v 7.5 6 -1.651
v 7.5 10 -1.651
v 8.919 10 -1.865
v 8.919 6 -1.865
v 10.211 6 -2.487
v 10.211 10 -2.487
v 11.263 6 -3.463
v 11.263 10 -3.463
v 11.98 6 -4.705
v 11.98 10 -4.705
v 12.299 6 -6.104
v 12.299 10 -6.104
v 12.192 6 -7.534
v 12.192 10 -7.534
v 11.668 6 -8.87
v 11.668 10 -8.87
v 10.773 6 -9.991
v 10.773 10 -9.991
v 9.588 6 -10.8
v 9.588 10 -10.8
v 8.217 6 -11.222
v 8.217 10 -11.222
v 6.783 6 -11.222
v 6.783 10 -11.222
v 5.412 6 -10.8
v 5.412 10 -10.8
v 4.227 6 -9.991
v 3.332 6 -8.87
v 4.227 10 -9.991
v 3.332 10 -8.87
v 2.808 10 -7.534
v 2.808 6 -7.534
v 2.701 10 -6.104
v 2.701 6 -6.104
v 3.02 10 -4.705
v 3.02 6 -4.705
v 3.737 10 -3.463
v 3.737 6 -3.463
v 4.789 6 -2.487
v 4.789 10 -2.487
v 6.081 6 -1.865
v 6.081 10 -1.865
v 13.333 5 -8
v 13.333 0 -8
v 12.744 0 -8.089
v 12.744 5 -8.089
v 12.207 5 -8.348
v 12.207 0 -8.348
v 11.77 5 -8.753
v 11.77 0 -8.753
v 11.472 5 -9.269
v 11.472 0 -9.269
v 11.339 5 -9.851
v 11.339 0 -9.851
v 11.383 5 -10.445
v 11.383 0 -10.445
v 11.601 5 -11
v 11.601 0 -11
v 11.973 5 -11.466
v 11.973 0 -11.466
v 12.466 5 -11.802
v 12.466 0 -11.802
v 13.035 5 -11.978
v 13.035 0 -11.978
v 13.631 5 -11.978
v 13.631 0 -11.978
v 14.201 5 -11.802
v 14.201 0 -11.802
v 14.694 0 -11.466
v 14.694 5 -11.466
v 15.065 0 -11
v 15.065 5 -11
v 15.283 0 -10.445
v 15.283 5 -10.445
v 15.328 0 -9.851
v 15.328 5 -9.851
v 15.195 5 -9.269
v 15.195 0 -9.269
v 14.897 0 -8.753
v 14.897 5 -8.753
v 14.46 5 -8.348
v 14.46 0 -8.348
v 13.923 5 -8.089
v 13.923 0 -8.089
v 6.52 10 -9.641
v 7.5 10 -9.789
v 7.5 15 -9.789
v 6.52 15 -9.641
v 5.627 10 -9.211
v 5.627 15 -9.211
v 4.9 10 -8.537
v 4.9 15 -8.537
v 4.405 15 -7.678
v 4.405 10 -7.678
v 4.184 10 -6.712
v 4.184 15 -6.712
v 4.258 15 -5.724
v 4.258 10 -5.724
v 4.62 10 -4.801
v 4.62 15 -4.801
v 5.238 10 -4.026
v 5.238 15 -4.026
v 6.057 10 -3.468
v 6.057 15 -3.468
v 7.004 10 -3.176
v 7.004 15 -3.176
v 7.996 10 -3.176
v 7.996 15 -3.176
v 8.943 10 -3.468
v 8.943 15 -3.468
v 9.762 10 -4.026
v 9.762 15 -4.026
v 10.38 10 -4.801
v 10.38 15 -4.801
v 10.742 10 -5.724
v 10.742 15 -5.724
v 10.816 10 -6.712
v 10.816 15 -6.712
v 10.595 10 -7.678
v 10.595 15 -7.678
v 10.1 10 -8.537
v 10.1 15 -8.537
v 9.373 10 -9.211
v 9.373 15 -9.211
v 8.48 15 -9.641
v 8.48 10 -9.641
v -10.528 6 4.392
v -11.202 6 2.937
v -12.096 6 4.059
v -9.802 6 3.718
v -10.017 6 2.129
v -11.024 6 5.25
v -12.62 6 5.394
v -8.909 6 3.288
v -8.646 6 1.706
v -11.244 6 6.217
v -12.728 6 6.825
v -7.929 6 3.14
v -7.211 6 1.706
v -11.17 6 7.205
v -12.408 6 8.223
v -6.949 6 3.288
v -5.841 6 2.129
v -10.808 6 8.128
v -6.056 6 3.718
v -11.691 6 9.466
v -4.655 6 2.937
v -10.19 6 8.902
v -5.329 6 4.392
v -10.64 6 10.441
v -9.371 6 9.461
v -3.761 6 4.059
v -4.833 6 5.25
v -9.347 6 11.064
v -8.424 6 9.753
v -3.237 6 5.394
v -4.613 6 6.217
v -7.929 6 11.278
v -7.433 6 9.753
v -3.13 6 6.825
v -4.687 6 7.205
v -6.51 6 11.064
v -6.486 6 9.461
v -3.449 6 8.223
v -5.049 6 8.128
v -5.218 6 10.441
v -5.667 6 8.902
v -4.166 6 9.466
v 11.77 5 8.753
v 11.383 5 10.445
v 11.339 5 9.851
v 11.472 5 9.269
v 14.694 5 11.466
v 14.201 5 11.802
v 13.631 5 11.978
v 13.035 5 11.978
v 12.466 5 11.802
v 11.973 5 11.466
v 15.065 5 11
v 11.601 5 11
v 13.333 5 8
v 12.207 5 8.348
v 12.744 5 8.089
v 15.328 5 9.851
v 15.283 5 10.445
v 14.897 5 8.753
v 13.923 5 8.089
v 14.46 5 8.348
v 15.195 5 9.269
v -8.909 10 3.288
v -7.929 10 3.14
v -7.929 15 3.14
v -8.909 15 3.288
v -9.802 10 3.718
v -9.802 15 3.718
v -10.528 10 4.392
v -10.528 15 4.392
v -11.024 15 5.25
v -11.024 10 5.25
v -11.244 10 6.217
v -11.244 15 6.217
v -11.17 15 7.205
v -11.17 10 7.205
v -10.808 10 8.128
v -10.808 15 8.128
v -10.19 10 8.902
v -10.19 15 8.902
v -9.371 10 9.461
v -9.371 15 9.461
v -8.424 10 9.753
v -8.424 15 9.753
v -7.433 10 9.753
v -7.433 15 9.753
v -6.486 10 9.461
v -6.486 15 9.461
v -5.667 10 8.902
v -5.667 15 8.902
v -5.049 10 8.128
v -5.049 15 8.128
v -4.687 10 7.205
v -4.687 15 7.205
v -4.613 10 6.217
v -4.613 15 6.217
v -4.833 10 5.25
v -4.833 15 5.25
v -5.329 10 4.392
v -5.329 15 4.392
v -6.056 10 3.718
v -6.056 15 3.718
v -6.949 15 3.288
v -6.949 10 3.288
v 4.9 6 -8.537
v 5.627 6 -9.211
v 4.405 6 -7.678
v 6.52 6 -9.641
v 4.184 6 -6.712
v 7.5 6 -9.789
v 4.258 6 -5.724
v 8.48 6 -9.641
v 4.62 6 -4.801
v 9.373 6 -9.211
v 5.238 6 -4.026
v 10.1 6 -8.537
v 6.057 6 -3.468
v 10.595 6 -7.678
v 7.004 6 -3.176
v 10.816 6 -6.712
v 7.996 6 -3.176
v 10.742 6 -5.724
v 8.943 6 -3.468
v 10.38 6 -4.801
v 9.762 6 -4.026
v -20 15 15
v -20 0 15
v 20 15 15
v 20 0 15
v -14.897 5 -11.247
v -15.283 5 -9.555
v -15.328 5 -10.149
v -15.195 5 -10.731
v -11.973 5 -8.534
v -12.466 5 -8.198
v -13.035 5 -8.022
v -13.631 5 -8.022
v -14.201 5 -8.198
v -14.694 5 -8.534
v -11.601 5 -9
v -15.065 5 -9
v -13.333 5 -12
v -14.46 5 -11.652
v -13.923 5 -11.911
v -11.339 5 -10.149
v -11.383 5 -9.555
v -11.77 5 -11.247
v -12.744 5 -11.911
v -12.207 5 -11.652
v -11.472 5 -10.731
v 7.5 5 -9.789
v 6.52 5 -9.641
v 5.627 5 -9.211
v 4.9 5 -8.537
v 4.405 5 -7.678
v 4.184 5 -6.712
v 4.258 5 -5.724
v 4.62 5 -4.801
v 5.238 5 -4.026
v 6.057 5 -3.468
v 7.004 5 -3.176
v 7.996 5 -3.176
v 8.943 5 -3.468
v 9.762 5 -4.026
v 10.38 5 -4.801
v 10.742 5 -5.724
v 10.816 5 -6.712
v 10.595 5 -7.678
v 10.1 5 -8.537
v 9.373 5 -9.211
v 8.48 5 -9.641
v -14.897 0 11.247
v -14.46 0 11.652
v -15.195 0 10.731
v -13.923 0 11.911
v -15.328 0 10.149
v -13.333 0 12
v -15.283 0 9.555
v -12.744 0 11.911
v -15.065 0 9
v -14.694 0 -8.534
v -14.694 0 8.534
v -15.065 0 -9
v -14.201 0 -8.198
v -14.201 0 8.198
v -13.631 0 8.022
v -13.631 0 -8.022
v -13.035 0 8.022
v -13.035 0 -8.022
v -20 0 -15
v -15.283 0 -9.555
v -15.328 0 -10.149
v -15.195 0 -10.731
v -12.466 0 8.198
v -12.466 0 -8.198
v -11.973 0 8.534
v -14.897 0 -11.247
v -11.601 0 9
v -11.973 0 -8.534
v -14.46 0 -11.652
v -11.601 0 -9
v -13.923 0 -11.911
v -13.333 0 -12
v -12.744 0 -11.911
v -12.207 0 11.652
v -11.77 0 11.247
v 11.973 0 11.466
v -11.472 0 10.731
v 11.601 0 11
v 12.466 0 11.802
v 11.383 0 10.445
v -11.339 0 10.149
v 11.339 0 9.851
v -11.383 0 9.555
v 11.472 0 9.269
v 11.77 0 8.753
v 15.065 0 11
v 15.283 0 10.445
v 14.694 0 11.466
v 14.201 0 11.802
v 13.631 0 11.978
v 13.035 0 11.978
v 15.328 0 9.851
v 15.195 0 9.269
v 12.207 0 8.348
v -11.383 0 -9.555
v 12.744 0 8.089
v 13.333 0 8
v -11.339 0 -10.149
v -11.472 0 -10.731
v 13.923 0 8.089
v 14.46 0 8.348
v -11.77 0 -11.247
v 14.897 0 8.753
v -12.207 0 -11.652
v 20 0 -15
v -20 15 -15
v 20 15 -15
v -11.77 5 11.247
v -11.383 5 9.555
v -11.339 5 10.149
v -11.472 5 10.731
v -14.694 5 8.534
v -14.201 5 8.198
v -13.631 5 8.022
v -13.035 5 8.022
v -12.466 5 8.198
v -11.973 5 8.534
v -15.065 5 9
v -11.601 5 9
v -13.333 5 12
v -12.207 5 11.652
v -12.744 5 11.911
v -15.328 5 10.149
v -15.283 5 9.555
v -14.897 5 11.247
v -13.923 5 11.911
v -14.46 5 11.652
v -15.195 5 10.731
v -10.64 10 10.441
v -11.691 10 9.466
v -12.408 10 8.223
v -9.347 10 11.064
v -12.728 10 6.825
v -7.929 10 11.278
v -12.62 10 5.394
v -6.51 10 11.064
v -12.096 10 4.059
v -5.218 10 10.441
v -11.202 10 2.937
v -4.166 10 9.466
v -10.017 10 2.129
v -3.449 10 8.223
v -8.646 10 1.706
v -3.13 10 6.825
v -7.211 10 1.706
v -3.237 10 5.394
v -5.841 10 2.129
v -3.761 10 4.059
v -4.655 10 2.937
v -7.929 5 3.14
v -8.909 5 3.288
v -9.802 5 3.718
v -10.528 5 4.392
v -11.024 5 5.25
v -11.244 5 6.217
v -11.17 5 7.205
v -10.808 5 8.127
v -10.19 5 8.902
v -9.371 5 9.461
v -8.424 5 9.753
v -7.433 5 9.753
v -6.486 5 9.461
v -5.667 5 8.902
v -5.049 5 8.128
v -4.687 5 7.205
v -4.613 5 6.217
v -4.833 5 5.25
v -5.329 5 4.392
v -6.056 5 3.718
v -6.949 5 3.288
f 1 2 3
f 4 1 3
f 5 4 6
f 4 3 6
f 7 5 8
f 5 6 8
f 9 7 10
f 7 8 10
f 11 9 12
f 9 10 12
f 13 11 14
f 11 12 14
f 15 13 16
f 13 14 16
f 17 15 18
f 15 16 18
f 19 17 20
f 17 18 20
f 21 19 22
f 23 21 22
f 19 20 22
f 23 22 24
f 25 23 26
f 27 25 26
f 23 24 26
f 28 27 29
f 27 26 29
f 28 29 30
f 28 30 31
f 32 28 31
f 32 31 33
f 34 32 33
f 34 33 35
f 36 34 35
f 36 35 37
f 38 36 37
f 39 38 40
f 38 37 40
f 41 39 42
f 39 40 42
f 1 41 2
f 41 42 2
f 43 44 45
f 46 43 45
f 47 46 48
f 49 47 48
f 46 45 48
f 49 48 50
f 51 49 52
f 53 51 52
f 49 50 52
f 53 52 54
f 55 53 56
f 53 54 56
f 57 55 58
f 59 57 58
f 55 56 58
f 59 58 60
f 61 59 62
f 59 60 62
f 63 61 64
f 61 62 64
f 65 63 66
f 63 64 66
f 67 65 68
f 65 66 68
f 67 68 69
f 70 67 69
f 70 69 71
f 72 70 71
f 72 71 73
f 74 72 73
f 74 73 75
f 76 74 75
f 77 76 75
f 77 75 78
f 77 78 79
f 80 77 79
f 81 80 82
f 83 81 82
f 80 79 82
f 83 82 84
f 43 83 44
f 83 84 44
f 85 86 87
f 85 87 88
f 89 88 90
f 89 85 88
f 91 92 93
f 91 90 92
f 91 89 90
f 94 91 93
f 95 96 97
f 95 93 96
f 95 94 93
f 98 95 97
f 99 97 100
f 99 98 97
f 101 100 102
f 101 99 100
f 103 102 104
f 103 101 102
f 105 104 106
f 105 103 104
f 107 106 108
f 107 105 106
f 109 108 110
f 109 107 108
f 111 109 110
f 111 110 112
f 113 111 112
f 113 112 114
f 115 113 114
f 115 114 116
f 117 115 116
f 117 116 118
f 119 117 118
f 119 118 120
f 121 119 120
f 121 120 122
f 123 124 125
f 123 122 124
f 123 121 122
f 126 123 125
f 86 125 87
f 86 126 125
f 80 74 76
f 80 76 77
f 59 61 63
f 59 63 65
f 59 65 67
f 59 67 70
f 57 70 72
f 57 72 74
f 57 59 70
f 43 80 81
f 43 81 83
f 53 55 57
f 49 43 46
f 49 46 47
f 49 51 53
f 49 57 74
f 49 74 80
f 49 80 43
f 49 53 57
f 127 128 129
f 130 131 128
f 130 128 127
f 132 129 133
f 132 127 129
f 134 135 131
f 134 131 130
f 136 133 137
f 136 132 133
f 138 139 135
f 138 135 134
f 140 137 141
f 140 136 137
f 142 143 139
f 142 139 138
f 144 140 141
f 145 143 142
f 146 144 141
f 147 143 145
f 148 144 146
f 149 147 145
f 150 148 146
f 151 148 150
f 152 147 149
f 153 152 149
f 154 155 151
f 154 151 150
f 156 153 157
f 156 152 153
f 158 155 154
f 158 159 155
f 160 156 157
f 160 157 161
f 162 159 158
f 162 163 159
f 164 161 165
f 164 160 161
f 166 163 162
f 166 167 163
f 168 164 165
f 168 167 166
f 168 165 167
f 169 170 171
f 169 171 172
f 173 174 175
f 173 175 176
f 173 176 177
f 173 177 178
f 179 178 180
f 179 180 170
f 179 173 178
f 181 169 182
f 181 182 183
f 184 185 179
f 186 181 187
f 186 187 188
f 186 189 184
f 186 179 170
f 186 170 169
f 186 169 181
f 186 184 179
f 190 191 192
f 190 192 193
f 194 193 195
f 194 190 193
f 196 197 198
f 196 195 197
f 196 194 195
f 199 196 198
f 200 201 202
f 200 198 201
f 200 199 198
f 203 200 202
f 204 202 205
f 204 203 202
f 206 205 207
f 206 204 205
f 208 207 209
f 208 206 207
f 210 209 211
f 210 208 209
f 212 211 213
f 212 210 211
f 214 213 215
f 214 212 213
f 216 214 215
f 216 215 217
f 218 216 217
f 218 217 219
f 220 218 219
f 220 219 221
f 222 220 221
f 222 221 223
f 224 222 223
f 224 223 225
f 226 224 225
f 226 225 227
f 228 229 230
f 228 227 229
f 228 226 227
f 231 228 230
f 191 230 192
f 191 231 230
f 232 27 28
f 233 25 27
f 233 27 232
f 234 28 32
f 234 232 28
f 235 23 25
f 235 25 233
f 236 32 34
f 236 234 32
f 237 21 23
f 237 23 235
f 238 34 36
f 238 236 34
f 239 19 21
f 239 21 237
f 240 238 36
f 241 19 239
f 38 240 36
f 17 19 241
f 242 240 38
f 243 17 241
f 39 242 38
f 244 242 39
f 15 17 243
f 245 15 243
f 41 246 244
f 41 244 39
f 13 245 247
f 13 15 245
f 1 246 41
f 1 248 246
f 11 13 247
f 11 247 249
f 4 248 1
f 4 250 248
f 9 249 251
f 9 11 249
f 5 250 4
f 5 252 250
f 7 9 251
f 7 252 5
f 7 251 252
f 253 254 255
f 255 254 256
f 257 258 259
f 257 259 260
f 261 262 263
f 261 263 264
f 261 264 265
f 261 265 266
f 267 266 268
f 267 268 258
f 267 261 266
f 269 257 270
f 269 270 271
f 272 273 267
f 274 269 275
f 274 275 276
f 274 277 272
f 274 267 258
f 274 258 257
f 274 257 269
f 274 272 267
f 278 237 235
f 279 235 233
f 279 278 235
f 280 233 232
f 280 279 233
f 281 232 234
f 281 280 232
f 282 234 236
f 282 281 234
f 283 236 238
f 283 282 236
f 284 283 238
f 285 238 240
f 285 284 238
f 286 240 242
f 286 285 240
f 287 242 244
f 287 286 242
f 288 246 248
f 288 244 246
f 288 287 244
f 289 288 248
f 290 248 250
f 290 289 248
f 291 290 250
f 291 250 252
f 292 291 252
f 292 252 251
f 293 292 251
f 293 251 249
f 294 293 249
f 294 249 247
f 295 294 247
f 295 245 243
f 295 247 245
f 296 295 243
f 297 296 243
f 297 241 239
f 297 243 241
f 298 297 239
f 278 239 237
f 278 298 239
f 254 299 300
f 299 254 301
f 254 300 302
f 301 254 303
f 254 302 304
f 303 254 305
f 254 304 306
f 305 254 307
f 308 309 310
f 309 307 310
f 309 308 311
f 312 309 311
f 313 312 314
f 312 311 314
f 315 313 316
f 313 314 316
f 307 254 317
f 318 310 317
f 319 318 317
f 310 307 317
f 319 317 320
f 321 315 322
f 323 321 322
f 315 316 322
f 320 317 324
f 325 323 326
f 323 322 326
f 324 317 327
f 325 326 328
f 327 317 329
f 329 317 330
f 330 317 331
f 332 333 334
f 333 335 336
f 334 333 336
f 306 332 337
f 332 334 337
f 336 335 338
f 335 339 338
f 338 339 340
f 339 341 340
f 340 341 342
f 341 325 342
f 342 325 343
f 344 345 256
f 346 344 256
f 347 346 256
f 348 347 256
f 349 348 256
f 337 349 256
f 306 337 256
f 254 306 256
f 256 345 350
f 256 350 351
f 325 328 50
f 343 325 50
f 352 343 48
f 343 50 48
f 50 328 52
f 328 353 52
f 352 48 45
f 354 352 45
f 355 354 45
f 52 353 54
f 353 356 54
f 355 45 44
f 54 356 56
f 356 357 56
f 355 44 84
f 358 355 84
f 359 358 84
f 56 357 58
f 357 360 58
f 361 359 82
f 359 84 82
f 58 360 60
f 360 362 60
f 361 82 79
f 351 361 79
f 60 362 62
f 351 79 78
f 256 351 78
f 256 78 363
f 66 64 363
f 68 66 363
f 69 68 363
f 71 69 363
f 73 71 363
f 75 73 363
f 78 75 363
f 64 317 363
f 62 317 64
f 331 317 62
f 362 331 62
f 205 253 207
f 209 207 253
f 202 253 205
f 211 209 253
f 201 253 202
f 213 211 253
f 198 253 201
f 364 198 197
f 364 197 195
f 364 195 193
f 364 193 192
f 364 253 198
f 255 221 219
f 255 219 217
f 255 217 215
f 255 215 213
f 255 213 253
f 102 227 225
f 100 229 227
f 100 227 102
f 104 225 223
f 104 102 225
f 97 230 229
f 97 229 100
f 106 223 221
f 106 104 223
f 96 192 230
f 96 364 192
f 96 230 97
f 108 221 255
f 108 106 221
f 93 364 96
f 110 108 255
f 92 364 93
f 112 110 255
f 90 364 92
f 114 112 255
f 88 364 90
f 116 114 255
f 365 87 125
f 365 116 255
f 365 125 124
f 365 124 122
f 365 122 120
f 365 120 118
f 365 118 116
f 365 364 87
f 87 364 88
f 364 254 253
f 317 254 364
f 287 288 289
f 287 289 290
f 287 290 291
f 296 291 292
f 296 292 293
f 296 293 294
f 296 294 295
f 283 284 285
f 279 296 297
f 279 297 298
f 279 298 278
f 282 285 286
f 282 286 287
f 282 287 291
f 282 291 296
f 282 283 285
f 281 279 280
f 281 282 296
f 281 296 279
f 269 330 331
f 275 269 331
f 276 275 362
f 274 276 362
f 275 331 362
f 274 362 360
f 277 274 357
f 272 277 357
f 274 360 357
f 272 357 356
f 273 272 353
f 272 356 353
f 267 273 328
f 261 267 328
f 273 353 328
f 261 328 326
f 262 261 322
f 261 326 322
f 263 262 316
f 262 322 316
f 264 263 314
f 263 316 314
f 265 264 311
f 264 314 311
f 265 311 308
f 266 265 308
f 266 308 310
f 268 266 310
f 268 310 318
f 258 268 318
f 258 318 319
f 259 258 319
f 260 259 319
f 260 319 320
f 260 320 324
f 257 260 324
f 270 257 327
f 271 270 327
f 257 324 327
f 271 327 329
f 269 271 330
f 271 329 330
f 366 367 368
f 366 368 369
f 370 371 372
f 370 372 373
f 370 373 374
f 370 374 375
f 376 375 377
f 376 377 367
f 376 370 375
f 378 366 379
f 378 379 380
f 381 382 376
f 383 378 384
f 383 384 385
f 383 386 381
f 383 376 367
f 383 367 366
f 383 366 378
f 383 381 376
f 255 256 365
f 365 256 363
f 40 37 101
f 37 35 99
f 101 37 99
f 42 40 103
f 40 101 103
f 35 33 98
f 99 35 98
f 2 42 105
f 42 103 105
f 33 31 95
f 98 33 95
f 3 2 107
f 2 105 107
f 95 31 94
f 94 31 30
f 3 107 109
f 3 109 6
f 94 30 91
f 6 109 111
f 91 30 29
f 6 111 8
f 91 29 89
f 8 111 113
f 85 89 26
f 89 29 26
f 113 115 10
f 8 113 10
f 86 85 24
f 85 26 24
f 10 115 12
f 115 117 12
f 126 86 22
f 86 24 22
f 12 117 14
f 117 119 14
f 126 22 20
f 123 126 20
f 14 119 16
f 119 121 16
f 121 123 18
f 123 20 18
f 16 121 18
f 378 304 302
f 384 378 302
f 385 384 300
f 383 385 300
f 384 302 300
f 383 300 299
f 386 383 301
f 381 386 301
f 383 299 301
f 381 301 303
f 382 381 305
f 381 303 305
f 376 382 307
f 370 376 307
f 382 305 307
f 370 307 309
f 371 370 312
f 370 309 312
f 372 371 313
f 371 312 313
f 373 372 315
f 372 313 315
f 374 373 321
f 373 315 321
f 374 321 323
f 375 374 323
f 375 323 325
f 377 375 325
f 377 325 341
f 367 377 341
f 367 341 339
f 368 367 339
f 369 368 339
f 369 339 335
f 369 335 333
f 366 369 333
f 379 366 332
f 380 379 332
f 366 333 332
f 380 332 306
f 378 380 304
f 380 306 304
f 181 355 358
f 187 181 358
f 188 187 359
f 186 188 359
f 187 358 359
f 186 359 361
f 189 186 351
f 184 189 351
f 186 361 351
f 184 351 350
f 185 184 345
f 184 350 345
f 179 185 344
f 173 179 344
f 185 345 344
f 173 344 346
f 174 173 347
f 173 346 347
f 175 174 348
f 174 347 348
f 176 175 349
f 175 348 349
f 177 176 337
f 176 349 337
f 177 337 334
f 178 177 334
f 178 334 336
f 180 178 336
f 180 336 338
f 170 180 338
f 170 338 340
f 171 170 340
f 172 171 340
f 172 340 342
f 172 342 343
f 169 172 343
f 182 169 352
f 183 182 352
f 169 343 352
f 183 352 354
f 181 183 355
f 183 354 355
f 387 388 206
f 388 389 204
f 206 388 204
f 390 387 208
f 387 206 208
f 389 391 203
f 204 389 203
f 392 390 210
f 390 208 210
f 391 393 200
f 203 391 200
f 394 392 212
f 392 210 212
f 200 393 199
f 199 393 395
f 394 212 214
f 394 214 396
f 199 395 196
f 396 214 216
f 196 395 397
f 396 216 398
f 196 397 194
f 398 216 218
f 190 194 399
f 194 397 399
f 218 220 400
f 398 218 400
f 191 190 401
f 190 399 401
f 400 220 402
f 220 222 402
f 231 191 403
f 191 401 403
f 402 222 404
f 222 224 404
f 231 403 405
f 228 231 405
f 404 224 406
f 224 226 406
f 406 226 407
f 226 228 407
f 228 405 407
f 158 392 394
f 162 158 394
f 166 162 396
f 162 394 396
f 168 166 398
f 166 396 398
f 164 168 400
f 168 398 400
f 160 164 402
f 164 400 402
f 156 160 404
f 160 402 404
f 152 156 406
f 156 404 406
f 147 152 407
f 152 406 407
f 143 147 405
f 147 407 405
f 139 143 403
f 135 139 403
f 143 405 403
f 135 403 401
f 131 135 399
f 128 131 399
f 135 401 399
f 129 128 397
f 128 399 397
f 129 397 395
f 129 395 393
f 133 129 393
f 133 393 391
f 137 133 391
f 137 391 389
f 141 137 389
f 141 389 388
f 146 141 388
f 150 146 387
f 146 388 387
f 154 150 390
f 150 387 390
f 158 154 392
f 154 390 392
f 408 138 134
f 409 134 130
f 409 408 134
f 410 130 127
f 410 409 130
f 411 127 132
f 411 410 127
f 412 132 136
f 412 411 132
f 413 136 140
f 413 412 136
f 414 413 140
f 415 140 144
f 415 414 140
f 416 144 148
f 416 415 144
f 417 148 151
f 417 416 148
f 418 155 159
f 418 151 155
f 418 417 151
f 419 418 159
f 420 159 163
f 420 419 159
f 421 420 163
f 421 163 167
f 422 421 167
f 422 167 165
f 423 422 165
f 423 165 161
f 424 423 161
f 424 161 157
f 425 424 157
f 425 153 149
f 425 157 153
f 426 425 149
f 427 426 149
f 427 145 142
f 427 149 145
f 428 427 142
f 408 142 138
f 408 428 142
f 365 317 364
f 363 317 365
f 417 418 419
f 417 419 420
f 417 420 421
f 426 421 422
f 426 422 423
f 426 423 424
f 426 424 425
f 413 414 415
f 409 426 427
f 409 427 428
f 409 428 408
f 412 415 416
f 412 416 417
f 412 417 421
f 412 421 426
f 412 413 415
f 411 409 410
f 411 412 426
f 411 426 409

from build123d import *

# Parameters (mm, degrees)
SKETCH1_W               = 40
SKETCH1_H               = 30
BOSS_EXTRUDE1_DEPTH     = 10
SKETCH2_R               = 2
CUT_EXTRUDE1_DEPTH      = 5
SKETCH3_R               = 4.8125
CUT_EXTRUDE2_DEPTH      = 4
SKETCH5_W               = 40
SKETCH5_H               = 30
BOSS_EXTRUDE2_DEPTH     = 5
CUT_EXTRUDE3_DEPTH      = 27.570660511
CUT_EXTRUDE3_DEPTH_BACK = 1
SKETCH4_R               = 3.325


with BuildPart() as part:
    # Sketch1 → Boss-Extrude1 (new body)
    with BuildSketch(Plane(origin=(0, 0, 0), x_dir=(1, 0, 0), z_dir=(0, 1, 0))):
        Rectangle(SKETCH1_W, SKETCH1_H)
    extrude(amount=BOSS_EXTRUDE1_DEPTH)

    # Sketch2 → Cut-Extrude1 (cut)
    with BuildSketch(Plane(origin=(0, 0, 0), x_dir=(-1, 0, 0), z_dir=(0, -1, 0))):
        with Locations(Location((-13.333333333, -10, 0), (0, 0, 90))):
            Circle(SKETCH2_R)
        with Locations(Location((13.333333333, -10, 0), (0, 0, 270))):
            Circle(SKETCH2_R)
        with Locations(Location((-13.333333333, 10, 0), (0, 0, 270))):
            Circle(SKETCH2_R)
        with Locations(Location((13.333333333, 10, 0), (0, 0, 90))):
            Circle(SKETCH2_R)
    extrude(amount=-CUT_EXTRUDE1_DEPTH, mode=Mode.SUBTRACT)

    # Sketch3 → Cut-Extrude2 (cut)
    with BuildSketch(Plane(origin=(0, 10, 0), x_dir=(1, 0, 0), z_dir=(0, 1, 0))):
        with Locations(Location((-7.9286, -6.465, 0), (0, 0, 270))):
            Circle(SKETCH3_R)
        with Locations(Location((7.5, 6.4636, 0), (0, 0, 270))):
            Circle(SKETCH3_R)
    extrude(amount=-CUT_EXTRUDE2_DEPTH, mode=Mode.SUBTRACT)

    # Sketch5 → Boss-Extrude2 (add)
    with BuildSketch(Plane(origin=(0, 10, 0), x_dir=(1, 0, 0), z_dir=(0, 1, 0))):
        Rectangle(SKETCH5_W, SKETCH5_H)
    extrude(amount=BOSS_EXTRUDE2_DEPTH)

    # Sketch4 → Cut-Extrude3 (cut, two sides: drawn at the far end of the back side and taken through both)
    with BuildSketch(Plane(origin=(0, 6, 0), x_dir=(1, 0, 0), z_dir=(0, 1, 0)).offset(-CUT_EXTRUDE3_DEPTH_BACK)):
        with Locations(Location((-7.9286, -6.465, 0), (0, 0, 90))):
            Circle(SKETCH4_R)
        with Locations(Location((7.5, 6.4636, 0), (0, 0, 90))):
            Circle(SKETCH4_R)
    extrude(amount=CUT_EXTRUDE3_DEPTH + CUT_EXTRUDE3_DEPTH_BACK, mode=Mode.SUBTRACT)


solid = part.part
